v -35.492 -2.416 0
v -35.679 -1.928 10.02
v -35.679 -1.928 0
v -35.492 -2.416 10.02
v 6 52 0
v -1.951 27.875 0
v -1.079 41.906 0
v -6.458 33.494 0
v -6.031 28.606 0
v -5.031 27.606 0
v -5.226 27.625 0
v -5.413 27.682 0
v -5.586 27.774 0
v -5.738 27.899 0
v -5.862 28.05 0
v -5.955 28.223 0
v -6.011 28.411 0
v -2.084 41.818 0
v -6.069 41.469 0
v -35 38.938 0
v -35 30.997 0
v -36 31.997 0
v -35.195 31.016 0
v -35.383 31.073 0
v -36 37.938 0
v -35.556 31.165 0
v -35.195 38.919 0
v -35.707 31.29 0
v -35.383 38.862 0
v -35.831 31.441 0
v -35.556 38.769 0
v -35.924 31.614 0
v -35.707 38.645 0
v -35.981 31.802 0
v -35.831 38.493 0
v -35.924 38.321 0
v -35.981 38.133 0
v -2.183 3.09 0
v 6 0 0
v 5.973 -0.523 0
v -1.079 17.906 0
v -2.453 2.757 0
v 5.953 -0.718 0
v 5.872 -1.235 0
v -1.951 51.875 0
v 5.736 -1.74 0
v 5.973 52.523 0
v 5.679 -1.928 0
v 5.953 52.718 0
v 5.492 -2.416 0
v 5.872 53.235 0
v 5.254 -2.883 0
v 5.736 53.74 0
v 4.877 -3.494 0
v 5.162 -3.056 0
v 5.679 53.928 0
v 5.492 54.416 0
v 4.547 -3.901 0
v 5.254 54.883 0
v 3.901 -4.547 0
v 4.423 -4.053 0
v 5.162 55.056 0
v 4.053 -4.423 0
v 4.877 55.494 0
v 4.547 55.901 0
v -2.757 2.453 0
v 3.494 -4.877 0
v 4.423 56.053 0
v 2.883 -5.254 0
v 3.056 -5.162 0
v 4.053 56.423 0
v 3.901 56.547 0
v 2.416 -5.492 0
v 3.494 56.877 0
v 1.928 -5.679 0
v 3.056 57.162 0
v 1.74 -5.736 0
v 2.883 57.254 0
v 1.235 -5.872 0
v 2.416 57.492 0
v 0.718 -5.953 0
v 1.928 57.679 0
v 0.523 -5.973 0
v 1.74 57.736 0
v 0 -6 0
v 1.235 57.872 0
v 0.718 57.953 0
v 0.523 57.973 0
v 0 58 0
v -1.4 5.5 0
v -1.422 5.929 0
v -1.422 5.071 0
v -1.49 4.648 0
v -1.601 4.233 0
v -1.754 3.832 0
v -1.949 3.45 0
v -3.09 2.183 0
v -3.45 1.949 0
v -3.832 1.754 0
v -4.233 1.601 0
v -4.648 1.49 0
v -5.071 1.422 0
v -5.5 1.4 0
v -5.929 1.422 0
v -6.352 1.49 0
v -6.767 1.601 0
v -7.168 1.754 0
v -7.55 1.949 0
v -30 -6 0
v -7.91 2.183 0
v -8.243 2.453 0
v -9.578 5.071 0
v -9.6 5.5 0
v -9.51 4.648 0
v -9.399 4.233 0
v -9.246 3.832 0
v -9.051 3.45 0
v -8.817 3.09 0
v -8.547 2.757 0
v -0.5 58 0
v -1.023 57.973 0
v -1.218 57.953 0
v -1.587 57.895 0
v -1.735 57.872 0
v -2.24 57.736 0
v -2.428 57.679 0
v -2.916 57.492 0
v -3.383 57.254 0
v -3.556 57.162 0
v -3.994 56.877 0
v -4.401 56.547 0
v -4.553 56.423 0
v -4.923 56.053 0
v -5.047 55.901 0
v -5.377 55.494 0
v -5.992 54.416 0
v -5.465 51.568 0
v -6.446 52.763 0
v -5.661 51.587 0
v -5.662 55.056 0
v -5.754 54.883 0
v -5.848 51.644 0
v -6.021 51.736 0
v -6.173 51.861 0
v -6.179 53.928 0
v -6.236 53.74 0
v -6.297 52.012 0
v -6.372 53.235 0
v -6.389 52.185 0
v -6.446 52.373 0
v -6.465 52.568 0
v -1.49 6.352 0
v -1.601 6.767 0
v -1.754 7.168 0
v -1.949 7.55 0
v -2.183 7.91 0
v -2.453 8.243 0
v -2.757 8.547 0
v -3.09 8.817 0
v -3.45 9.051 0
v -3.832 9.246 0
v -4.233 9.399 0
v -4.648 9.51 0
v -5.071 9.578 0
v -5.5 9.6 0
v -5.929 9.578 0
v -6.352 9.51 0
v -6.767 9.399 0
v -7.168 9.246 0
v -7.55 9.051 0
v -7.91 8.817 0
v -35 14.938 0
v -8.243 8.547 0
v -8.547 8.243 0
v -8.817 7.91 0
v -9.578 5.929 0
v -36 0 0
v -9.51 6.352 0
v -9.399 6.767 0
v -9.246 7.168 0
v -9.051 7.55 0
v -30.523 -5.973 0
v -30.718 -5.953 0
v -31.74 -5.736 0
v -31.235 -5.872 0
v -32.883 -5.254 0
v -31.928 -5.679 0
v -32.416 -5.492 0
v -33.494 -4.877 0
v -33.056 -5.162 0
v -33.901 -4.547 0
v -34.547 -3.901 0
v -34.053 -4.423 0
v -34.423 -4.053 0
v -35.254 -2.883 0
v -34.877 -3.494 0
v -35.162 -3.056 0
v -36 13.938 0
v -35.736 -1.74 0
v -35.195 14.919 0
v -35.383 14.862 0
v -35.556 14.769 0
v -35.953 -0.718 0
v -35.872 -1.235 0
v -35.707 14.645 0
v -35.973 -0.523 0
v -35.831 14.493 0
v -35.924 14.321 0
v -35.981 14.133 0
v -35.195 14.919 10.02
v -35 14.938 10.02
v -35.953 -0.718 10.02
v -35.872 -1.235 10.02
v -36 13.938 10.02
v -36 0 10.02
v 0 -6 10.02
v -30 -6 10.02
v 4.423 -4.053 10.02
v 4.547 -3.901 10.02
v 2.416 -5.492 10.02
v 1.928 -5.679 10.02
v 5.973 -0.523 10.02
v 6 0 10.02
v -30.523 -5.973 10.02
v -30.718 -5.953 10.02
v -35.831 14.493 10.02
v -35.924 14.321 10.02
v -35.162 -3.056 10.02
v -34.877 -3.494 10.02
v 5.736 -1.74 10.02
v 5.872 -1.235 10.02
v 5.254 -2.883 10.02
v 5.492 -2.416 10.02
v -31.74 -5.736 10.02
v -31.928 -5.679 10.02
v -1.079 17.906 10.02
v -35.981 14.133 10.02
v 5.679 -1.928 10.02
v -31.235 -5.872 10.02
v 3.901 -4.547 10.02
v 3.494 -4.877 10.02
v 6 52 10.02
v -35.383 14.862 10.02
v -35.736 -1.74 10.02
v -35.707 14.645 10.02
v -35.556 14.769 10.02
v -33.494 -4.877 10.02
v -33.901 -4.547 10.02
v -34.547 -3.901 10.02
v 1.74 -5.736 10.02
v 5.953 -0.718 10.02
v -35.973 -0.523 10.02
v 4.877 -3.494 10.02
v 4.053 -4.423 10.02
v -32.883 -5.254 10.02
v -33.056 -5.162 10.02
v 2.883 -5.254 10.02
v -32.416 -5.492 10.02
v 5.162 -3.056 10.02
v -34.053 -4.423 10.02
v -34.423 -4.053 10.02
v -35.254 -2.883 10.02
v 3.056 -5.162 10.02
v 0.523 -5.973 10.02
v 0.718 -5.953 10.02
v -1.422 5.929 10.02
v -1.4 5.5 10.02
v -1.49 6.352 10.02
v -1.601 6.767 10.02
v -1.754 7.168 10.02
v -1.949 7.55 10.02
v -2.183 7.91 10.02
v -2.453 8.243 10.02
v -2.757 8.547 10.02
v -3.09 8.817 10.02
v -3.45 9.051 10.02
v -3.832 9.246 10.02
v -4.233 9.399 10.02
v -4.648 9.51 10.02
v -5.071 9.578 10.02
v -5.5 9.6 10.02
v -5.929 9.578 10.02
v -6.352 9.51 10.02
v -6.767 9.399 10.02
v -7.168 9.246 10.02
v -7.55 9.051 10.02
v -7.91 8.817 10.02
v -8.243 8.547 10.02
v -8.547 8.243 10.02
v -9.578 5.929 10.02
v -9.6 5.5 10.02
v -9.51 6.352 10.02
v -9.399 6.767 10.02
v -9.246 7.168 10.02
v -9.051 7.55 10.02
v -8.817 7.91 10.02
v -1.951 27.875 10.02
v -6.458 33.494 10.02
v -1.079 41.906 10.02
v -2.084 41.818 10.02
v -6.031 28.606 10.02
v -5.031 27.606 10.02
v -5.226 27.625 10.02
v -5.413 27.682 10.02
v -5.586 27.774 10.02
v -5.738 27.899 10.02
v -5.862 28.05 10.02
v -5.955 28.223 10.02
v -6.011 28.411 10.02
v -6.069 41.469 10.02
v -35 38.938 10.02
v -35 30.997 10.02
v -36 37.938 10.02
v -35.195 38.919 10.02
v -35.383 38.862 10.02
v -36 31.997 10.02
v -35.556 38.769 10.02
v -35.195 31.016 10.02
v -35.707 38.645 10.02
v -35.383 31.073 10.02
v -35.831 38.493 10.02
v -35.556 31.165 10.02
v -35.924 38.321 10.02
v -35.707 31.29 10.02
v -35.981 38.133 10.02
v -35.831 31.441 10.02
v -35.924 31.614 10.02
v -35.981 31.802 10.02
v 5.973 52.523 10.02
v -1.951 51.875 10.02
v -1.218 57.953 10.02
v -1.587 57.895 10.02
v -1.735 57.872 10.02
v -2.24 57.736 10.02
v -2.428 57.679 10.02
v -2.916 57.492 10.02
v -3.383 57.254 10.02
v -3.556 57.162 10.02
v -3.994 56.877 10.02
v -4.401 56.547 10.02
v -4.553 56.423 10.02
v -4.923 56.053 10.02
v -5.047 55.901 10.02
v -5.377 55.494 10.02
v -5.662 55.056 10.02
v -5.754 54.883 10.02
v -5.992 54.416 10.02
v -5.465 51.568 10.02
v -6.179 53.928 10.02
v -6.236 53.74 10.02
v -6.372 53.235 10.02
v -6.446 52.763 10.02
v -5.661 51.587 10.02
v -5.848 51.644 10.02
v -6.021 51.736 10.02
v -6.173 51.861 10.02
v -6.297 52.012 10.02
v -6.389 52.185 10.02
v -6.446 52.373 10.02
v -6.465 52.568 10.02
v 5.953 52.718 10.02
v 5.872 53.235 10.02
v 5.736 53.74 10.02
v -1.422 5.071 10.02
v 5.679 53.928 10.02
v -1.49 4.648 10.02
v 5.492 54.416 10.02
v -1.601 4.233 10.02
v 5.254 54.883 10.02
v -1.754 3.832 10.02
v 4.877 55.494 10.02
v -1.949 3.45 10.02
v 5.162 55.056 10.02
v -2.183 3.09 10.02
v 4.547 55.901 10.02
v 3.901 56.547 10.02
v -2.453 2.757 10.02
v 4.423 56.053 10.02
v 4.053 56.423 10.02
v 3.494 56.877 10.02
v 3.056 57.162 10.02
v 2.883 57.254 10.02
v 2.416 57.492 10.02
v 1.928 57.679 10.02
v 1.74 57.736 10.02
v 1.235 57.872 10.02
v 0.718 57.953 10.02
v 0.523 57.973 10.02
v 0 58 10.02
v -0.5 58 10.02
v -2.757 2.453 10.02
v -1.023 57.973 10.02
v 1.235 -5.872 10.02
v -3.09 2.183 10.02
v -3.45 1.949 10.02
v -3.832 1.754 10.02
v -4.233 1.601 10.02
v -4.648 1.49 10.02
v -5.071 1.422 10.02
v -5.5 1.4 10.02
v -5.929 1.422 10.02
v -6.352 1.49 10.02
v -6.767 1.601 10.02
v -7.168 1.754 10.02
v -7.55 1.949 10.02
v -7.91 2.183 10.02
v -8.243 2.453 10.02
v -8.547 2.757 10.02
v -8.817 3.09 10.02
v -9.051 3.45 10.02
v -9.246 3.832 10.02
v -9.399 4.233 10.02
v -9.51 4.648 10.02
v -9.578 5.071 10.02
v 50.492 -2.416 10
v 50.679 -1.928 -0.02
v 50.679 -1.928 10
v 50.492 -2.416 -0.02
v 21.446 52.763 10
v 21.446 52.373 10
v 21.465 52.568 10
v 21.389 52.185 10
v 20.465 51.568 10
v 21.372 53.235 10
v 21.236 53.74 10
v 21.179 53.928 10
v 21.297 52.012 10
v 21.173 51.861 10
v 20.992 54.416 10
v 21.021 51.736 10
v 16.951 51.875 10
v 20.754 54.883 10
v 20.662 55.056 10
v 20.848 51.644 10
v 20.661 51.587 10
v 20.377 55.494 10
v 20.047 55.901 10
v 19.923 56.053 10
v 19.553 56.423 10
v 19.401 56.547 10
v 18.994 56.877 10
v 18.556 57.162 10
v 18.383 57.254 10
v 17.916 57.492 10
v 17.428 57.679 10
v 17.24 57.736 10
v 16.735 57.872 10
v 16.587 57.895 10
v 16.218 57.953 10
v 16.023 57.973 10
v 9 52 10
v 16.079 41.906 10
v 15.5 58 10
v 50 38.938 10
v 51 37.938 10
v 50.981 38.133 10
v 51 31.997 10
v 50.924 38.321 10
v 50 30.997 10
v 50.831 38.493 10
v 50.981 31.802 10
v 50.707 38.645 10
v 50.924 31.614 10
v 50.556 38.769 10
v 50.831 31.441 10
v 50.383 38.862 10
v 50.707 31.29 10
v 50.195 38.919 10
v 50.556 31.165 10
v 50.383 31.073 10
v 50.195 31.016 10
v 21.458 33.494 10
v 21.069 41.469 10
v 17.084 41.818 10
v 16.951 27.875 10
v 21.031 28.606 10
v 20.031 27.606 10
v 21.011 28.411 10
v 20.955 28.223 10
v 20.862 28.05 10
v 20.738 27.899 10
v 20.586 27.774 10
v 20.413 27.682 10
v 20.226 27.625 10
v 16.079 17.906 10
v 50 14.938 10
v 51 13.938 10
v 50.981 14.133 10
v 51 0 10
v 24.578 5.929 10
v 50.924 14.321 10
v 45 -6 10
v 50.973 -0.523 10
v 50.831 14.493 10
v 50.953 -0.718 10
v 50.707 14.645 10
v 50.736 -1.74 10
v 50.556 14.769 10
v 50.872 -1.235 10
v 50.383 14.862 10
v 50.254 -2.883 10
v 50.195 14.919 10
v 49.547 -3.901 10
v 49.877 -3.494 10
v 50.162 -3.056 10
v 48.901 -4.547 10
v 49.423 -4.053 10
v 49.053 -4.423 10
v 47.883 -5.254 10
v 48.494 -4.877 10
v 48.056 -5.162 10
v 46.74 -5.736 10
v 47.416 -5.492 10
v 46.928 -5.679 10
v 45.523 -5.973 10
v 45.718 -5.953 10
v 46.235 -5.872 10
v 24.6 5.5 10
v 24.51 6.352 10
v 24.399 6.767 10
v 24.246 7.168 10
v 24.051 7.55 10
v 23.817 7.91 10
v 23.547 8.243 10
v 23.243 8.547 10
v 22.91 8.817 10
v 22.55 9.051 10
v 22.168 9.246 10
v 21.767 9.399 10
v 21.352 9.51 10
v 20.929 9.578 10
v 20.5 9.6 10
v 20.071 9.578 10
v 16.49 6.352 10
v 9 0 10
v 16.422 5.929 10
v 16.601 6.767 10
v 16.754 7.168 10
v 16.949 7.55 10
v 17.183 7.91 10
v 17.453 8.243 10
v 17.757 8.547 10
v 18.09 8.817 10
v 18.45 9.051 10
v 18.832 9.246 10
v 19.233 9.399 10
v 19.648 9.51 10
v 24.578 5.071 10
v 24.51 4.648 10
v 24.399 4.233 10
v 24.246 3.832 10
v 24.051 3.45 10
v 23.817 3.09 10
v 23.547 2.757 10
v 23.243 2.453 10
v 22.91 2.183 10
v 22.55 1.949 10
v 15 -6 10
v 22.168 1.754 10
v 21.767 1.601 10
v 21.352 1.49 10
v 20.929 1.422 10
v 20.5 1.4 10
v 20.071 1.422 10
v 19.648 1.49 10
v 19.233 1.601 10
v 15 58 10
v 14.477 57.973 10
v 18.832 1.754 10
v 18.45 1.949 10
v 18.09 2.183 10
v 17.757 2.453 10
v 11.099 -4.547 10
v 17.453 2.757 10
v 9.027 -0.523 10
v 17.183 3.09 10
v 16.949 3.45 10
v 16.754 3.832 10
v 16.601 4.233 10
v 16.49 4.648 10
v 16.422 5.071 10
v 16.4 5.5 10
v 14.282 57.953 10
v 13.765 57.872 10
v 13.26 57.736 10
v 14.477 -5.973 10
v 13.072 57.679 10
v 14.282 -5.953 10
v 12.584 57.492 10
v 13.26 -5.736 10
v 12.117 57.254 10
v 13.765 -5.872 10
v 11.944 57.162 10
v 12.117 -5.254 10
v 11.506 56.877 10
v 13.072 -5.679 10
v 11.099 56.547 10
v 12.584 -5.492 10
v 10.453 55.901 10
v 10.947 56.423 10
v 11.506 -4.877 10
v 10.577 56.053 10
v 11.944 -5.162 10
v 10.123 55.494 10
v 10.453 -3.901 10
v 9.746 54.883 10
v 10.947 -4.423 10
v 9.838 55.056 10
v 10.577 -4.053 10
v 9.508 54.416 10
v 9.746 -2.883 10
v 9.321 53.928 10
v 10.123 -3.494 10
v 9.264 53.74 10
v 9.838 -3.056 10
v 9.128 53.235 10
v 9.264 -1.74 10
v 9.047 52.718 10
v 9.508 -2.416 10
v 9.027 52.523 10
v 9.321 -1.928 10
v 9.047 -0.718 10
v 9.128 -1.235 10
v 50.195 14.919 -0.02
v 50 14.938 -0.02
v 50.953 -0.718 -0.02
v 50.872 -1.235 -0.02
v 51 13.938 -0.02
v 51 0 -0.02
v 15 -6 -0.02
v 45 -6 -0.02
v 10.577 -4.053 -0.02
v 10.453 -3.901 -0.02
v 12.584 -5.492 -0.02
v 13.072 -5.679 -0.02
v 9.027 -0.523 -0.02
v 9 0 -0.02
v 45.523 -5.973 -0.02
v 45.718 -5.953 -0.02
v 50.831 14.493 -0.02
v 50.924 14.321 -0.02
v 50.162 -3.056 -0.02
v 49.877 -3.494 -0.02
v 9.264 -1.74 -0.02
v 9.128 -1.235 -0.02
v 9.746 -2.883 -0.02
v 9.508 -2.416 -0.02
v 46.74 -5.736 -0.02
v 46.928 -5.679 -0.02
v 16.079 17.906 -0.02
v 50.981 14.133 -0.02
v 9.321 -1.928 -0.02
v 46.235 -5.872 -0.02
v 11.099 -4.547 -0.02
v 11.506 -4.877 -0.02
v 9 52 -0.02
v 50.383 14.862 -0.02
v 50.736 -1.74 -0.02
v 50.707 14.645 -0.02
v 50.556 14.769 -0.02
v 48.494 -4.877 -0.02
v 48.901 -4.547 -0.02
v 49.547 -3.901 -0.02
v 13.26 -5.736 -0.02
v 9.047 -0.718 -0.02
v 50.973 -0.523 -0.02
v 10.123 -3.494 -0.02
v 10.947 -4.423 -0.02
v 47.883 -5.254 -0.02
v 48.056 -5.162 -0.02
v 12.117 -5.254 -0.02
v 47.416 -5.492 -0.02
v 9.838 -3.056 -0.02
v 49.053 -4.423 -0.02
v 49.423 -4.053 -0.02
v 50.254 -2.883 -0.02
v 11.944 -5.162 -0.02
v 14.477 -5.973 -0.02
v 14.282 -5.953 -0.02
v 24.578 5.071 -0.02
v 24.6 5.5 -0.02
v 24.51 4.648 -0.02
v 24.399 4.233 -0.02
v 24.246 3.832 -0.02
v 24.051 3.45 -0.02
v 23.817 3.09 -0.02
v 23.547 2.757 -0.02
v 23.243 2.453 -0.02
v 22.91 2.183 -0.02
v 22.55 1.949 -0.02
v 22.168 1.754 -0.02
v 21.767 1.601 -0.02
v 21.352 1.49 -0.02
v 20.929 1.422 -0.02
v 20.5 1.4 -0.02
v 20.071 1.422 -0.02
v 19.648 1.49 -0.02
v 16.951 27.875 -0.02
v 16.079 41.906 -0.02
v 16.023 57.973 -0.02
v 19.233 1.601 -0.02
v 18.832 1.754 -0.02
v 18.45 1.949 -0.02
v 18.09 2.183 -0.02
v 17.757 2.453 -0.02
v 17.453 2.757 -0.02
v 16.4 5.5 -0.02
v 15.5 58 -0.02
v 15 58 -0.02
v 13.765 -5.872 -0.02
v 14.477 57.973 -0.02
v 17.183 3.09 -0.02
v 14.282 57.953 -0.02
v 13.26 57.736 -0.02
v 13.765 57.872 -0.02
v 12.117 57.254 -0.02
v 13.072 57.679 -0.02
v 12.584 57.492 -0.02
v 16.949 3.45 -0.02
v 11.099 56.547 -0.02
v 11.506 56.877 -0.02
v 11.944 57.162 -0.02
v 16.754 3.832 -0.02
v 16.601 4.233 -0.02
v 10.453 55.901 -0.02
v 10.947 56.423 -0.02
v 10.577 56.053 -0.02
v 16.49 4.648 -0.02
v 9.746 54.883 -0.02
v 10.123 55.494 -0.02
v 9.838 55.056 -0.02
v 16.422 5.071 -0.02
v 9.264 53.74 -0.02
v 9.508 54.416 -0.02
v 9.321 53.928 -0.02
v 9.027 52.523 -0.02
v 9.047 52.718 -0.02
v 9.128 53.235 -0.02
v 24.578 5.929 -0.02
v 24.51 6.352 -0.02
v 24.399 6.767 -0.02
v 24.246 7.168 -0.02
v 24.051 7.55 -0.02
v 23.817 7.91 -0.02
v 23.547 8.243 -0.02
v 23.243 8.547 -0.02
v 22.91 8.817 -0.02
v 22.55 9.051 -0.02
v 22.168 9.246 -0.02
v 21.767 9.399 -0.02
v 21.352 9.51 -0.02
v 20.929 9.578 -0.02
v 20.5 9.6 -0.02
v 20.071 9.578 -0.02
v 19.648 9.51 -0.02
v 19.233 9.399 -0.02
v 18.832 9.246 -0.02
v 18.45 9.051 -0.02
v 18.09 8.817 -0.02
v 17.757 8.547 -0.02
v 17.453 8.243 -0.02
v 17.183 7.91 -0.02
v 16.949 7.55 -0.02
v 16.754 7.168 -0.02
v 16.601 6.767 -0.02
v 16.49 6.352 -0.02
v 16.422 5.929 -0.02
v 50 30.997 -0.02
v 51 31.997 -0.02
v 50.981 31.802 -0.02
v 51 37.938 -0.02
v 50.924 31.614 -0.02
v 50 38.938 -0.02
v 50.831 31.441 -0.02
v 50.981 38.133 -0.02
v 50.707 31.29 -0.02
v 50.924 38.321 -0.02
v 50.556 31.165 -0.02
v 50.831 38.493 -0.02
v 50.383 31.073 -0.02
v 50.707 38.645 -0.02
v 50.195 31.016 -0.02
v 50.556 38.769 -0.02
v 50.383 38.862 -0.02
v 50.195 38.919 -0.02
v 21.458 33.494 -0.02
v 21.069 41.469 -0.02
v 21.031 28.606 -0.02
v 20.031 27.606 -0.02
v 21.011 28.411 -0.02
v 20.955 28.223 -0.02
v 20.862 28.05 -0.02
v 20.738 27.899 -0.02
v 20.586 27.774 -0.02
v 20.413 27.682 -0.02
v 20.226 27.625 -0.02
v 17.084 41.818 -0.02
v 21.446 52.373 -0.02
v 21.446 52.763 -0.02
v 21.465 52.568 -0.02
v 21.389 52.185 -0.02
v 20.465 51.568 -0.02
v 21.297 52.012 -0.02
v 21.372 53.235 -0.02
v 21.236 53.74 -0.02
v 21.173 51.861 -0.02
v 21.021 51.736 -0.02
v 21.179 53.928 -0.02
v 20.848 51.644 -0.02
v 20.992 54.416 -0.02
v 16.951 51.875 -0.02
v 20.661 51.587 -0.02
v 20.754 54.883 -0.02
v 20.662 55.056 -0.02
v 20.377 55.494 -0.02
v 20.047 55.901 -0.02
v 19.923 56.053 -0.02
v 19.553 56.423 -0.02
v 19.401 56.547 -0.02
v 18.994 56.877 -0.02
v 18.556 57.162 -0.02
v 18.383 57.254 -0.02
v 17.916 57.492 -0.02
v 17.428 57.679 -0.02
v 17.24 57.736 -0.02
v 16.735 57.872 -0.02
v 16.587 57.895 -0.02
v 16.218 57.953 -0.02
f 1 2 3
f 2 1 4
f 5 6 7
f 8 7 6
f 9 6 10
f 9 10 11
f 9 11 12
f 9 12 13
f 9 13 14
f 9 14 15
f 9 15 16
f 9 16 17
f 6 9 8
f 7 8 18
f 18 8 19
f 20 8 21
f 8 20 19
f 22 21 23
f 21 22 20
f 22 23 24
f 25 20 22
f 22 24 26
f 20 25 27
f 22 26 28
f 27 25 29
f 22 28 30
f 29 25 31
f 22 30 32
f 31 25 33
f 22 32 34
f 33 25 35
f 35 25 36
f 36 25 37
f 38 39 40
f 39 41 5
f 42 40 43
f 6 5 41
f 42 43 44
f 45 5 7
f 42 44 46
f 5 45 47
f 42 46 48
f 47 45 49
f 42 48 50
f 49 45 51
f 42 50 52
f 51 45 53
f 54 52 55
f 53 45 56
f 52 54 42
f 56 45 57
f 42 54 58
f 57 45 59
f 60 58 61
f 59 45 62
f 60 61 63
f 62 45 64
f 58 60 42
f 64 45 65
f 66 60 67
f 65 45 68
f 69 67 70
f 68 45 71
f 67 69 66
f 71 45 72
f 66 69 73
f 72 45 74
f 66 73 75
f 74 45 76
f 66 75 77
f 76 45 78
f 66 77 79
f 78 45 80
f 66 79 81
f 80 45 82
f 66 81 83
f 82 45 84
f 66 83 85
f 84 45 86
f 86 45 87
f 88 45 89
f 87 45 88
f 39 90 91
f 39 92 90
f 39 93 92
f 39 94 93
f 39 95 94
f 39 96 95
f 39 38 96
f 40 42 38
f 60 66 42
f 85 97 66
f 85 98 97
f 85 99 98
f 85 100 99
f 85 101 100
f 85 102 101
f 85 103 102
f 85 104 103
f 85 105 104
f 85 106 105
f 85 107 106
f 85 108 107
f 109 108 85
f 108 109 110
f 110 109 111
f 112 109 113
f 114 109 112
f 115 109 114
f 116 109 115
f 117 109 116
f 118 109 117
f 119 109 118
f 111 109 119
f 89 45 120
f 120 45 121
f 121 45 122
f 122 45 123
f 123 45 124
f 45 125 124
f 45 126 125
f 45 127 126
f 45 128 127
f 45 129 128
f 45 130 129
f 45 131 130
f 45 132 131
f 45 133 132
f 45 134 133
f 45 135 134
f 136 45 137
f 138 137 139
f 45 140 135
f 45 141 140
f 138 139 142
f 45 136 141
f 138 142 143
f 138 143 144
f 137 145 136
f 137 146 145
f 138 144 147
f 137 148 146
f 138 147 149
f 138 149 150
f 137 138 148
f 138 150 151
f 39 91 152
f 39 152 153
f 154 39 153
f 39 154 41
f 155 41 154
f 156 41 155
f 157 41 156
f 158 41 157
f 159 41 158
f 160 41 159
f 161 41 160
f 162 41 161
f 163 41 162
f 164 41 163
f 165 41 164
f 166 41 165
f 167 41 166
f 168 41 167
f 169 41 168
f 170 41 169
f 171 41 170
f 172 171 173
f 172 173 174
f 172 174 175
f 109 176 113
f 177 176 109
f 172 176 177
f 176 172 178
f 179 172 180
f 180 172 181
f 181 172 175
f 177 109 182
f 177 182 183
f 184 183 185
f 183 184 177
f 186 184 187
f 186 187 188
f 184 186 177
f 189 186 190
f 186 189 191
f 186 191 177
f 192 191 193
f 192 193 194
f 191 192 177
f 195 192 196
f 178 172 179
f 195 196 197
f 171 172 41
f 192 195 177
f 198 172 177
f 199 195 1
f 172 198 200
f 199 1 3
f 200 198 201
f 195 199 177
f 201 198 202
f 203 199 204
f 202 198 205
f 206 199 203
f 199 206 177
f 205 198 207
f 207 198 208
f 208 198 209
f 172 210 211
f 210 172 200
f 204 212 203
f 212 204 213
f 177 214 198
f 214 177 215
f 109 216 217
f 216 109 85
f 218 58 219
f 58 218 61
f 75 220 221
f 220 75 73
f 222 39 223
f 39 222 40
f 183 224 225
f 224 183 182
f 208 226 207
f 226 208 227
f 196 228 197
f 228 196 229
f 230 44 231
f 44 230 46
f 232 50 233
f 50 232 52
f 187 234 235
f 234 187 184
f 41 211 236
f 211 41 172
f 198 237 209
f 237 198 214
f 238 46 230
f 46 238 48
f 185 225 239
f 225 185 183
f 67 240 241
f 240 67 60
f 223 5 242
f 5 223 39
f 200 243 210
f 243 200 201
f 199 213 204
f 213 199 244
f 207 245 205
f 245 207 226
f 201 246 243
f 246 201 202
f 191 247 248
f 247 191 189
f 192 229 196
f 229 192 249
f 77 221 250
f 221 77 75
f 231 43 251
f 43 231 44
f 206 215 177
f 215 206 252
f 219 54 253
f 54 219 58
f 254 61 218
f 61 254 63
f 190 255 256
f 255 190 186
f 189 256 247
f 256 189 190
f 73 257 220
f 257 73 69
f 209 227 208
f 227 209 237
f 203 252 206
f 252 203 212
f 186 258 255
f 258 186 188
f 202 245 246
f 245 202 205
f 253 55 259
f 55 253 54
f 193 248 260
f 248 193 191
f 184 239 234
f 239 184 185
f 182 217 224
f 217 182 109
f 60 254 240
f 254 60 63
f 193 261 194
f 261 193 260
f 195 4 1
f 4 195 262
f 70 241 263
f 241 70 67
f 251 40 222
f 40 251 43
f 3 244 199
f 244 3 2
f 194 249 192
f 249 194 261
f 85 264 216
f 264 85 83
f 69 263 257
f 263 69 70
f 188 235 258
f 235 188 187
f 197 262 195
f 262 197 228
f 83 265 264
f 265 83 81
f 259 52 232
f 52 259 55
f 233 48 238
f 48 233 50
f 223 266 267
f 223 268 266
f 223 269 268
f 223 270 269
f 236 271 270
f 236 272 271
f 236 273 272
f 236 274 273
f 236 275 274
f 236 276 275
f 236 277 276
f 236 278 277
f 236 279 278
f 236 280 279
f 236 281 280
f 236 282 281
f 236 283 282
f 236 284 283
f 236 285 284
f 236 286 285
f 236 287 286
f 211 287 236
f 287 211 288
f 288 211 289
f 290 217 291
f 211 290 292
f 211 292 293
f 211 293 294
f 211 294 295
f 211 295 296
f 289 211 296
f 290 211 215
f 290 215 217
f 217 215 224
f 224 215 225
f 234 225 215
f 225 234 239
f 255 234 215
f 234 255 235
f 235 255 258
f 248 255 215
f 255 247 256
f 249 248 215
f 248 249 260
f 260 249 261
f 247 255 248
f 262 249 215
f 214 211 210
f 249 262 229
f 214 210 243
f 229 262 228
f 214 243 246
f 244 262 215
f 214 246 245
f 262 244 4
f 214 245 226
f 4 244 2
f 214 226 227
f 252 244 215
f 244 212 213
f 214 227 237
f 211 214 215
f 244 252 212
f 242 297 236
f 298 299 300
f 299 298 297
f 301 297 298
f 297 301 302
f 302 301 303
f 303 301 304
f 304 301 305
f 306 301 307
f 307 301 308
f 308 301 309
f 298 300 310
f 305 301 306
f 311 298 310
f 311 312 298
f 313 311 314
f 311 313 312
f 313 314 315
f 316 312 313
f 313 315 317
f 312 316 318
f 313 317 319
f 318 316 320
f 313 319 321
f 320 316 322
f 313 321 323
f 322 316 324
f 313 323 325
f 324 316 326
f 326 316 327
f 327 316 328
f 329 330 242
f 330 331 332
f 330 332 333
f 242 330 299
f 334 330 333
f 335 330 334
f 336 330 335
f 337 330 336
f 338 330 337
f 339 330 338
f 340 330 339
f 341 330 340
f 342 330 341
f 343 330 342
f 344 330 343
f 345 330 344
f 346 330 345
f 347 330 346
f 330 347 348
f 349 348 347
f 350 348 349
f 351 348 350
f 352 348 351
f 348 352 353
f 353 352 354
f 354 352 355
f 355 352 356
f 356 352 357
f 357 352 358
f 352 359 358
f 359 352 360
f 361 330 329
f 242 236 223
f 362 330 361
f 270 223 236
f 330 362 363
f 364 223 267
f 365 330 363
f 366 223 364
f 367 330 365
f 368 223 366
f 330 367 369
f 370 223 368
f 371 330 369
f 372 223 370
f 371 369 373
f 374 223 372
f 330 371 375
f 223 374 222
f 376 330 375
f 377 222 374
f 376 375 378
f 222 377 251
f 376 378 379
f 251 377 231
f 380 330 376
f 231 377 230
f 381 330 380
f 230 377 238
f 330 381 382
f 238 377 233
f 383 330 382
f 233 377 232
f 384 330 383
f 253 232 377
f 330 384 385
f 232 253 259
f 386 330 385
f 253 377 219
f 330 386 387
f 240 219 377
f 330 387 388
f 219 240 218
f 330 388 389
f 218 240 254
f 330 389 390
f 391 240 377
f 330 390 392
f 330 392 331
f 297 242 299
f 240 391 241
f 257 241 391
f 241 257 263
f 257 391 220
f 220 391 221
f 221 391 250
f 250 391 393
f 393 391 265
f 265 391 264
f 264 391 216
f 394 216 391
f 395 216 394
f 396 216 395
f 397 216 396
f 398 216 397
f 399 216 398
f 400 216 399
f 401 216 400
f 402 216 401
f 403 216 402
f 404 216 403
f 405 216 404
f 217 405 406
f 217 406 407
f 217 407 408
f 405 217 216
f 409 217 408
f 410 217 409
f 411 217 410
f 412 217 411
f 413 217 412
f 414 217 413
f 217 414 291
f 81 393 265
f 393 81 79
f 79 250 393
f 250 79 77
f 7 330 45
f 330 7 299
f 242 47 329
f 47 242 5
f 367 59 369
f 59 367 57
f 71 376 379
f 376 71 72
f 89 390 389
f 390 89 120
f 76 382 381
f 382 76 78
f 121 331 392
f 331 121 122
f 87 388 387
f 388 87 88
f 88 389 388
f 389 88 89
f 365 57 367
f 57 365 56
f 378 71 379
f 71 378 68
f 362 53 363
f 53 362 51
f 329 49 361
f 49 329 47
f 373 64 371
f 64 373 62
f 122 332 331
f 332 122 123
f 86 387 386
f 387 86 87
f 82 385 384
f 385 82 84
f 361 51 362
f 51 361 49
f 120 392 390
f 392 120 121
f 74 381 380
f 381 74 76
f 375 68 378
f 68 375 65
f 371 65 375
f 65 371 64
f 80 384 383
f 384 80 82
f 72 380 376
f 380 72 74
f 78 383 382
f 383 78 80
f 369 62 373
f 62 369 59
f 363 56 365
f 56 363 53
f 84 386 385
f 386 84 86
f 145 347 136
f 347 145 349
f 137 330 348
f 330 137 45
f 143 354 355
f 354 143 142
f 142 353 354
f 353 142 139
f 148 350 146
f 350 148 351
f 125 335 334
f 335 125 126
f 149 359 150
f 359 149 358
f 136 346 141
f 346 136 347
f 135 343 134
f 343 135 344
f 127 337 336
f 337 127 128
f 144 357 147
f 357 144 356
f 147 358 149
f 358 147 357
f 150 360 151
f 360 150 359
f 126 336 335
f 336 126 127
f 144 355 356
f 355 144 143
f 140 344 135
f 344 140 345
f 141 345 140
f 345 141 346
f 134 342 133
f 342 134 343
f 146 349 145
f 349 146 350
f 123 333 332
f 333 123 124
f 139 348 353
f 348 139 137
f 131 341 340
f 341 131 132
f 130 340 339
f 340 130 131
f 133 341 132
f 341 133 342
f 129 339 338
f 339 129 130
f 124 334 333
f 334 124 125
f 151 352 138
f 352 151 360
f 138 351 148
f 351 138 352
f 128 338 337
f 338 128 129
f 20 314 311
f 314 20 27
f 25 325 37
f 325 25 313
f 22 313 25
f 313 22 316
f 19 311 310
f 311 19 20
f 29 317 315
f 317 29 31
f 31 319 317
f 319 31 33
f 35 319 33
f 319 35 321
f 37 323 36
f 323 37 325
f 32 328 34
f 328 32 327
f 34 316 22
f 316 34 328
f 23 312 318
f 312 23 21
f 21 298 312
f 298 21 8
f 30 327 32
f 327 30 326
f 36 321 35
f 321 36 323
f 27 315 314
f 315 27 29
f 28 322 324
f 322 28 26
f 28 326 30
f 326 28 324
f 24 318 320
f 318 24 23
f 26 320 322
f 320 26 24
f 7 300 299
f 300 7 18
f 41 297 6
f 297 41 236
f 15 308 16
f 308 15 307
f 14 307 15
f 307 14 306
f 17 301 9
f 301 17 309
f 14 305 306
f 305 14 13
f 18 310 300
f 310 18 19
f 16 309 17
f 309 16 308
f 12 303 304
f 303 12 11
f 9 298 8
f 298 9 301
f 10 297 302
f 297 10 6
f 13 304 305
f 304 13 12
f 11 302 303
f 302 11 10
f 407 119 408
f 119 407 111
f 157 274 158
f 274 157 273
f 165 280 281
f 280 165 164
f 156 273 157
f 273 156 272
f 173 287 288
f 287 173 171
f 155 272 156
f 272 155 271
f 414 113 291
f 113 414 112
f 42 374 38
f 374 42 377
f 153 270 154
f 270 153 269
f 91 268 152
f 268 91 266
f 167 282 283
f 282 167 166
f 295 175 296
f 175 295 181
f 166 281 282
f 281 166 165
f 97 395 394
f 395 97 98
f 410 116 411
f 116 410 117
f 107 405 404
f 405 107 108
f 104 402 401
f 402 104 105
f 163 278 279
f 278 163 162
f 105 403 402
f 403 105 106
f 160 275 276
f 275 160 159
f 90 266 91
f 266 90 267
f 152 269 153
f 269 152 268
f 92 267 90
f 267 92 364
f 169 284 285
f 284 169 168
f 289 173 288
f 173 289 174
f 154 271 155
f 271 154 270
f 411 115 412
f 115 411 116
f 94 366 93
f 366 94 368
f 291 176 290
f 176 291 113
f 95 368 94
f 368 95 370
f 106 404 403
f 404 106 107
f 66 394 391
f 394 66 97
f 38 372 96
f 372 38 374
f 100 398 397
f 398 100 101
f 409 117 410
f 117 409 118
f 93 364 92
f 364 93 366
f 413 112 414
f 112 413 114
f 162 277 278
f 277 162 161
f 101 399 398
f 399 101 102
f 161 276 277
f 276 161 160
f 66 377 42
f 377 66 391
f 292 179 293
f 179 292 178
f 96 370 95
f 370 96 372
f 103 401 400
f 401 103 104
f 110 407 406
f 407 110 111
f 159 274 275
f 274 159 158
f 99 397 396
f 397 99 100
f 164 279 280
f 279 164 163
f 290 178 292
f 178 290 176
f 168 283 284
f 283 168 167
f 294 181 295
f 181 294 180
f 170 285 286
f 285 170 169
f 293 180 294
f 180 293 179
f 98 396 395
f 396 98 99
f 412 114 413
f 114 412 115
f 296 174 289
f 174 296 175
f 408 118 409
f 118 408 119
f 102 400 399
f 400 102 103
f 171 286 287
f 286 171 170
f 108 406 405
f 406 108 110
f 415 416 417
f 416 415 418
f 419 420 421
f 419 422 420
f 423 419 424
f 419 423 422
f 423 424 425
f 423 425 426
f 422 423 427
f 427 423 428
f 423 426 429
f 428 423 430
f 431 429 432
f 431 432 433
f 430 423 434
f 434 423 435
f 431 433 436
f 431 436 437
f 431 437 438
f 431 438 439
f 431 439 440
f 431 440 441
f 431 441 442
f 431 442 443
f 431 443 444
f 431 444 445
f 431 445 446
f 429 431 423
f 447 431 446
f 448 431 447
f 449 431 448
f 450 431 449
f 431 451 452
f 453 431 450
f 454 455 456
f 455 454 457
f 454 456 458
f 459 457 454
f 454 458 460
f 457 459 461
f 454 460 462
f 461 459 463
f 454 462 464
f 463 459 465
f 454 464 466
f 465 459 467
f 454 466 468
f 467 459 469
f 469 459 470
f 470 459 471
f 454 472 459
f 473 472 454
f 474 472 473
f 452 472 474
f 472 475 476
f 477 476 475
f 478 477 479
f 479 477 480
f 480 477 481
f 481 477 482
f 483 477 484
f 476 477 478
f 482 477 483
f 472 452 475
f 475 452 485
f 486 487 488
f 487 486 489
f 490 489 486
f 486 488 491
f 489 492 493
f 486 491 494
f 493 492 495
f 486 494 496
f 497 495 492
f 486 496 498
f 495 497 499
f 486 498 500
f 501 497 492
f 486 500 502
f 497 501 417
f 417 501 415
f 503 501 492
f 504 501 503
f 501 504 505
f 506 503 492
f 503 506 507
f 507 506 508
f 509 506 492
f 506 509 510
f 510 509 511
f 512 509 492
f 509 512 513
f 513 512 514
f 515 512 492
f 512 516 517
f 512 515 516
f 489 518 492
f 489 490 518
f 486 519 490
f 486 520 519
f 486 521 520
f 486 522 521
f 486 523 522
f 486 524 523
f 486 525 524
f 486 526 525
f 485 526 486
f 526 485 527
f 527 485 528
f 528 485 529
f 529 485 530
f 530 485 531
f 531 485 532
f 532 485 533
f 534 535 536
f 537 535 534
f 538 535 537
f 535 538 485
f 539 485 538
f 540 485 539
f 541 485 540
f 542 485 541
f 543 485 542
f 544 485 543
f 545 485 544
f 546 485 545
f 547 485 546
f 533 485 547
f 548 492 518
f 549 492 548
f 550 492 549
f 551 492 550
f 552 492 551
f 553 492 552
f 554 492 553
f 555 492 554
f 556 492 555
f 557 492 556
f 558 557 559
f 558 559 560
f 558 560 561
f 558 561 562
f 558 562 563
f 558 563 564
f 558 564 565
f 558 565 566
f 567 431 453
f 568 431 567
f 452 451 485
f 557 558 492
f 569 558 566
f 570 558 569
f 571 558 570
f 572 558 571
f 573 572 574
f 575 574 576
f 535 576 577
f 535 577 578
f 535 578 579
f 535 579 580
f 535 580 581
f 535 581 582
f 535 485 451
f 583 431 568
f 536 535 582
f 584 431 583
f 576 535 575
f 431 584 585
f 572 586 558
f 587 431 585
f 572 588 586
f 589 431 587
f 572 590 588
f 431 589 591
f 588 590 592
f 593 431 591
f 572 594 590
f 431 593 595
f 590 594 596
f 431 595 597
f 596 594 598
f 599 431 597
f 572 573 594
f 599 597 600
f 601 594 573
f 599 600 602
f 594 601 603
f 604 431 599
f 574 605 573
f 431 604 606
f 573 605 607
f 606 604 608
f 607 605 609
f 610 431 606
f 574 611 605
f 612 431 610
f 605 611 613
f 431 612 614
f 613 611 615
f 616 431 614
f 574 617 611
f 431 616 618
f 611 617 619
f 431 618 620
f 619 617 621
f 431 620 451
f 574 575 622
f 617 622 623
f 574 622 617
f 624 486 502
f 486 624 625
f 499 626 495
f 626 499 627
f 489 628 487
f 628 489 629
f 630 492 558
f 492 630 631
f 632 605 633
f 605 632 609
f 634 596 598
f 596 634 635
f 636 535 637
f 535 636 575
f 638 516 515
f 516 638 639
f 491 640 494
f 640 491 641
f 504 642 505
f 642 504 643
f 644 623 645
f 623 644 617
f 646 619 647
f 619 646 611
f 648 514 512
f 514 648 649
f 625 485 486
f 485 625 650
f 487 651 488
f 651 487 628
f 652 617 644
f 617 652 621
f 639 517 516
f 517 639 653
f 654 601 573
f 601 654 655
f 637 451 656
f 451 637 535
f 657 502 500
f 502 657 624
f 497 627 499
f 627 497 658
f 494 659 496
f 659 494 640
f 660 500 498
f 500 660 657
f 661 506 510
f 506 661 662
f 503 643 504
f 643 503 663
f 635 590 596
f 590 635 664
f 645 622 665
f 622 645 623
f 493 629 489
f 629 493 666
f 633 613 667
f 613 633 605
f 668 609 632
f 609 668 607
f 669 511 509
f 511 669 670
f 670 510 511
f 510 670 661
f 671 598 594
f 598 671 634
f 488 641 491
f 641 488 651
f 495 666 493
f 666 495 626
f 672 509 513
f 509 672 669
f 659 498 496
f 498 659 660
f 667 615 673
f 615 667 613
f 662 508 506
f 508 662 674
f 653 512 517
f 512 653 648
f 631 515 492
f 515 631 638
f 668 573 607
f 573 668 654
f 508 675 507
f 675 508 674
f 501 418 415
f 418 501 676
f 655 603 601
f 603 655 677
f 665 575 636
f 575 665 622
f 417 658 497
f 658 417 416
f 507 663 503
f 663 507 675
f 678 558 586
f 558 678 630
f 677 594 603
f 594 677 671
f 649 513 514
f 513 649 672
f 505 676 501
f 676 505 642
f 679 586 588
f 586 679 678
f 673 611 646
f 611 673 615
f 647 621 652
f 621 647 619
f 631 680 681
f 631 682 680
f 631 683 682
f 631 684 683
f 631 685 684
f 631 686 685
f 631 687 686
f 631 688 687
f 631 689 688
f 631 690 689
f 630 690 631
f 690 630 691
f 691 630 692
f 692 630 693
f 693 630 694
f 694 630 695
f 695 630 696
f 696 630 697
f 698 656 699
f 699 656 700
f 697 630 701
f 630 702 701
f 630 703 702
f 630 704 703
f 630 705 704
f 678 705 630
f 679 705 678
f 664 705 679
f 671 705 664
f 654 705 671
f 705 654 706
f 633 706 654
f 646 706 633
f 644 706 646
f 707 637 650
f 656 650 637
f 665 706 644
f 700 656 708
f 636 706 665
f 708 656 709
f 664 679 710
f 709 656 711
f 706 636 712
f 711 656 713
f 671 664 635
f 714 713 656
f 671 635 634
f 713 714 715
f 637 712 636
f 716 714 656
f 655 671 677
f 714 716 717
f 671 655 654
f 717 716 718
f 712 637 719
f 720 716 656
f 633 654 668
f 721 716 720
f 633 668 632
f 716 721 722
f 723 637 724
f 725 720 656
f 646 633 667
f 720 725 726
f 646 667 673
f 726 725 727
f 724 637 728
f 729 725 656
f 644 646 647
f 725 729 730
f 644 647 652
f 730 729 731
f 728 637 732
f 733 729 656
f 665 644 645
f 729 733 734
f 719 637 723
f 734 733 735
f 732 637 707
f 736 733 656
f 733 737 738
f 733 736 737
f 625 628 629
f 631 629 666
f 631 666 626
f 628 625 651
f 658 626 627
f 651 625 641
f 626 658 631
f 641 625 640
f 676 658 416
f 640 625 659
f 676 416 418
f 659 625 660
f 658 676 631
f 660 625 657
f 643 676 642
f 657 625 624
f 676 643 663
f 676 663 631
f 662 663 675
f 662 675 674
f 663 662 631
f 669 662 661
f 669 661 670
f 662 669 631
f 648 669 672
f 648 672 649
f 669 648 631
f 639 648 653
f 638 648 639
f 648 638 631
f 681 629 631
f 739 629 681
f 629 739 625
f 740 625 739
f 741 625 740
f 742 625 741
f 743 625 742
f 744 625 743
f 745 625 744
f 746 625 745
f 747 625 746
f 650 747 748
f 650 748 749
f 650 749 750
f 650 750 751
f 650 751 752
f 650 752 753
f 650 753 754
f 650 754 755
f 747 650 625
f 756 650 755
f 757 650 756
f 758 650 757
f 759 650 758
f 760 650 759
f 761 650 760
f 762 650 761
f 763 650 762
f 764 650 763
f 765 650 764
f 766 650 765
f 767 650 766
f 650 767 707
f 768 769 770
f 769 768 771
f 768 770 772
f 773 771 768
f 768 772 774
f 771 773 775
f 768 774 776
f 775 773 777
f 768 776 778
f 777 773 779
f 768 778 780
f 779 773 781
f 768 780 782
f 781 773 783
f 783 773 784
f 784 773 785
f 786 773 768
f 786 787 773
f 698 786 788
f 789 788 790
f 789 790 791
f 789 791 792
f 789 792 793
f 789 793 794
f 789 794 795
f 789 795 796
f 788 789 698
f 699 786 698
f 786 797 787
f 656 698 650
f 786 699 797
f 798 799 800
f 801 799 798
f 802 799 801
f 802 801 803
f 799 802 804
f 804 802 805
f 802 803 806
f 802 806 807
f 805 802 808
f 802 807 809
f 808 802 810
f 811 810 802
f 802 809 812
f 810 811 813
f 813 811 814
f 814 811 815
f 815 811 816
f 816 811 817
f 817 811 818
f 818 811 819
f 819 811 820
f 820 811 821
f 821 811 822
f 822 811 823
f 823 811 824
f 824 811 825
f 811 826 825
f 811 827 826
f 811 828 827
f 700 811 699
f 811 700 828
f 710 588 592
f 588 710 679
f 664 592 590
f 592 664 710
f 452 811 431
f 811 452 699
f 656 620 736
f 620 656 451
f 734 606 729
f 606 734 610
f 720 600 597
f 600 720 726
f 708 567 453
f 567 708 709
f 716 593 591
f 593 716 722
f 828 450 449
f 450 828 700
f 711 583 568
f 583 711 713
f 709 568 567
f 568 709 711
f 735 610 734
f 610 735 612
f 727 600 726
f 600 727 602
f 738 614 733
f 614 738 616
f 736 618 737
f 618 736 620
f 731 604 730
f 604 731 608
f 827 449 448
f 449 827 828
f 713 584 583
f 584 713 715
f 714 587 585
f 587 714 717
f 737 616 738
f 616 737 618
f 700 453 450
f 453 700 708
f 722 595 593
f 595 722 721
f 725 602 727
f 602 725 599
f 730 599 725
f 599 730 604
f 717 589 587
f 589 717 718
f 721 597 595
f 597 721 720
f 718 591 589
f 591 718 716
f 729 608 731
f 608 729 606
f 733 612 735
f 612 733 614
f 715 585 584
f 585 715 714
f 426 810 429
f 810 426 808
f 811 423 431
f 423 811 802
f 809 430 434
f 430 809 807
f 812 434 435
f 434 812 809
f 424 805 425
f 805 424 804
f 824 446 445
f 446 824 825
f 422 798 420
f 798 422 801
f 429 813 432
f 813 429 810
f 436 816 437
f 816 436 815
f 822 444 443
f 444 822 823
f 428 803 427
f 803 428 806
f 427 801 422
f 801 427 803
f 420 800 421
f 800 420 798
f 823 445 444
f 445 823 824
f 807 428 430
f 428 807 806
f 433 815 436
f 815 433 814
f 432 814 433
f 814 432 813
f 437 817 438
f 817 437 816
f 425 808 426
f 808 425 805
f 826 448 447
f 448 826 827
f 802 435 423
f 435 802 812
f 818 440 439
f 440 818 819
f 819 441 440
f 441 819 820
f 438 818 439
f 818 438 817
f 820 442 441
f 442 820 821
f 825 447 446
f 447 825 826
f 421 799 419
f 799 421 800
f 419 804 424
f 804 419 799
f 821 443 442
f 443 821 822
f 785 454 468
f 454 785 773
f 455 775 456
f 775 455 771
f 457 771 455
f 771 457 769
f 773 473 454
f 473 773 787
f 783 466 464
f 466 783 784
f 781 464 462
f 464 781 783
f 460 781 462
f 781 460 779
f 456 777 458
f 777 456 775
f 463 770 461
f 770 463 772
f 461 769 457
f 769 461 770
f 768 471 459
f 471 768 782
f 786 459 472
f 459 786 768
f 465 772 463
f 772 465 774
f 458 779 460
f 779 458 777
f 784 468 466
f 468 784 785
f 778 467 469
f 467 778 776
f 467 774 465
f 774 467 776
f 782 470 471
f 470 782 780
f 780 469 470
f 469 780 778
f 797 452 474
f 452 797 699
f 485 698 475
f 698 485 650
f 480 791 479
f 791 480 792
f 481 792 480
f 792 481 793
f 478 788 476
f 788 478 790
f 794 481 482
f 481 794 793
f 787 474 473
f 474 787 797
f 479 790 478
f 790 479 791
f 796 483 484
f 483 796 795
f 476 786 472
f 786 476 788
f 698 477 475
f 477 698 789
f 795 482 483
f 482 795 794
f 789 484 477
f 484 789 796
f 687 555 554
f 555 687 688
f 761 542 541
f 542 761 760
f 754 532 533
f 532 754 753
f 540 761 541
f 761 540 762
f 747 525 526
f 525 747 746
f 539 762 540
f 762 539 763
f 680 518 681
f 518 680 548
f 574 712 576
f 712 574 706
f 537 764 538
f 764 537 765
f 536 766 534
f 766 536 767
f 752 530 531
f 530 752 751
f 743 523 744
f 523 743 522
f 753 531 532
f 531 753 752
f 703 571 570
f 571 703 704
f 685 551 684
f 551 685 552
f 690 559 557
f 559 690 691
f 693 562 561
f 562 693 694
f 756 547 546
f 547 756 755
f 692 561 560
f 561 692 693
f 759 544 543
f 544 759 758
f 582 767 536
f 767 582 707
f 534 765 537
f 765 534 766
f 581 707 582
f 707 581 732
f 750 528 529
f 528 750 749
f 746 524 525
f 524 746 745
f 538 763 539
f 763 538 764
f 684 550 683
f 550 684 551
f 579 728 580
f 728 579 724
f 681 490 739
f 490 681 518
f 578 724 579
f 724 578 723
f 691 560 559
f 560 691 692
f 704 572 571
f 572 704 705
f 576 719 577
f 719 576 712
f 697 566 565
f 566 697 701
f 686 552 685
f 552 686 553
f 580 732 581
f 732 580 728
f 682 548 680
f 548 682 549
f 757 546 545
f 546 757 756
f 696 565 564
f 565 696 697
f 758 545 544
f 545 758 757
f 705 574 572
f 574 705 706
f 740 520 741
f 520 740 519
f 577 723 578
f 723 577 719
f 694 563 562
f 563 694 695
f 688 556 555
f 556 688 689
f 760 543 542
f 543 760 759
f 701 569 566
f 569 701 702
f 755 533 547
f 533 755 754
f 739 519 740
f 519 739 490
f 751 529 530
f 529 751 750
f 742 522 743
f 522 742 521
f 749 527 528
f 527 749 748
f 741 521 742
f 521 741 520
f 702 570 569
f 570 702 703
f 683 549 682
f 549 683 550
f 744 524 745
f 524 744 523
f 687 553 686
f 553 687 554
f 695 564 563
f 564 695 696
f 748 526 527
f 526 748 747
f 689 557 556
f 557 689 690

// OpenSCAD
num_keyboards = 2;		// [1:1:20]
keyboard_to_keyboard = 24;	// [8:100]
keyboard_thickness = 12;	// [5:100]
flange = 4;			// [1:50]
thickness = 10;			// [3:50]

/* [Hidden] */
$fa = 6;
$fs = 0.2;
e = 0.01;

for (side=[0,1]) translate([side * 15, 0, side*thickness]) rotate([0, -90+side*180, 0])
difference()
{
	minkowski()
	{	
		difference()
		{
			minkowski()
			{	
				difference()
				{
					ySz = (num_keyboards - 1) * keyboard_to_keyboard + keyboard_thickness + 16;
					cube([thickness, ySz, 30]);
					translate([-e, ySz-keyboard_thickness-2, max(e, flange - 3.5)])cube([thickness+2*e, ySz, 30]);
				}
				rotate([0, 90, 0]) cylinder(e, r=5);
			}
			
			for (keyb = [0:num_keyboards-1])
			translate([-10, 17 + keyb * keyboard_to_keyboard, 0]) rotate([5, 0, 0]) union()
			{
				cube([200, keyboard_thickness, 100]);
				if (keyb < num_keyboards-1)
					translate([0, keyboard_thickness-e, flange]) cube([200, keyboard_thickness/2, 100]);
			}
			
		}

		rotate([0, 90, 0]) cylinder(e, r=1);
	}

	translate([-10, 5.5, 5.5]) rotate([0, 90, 0]) cylinder(200, d=8.2);
}
